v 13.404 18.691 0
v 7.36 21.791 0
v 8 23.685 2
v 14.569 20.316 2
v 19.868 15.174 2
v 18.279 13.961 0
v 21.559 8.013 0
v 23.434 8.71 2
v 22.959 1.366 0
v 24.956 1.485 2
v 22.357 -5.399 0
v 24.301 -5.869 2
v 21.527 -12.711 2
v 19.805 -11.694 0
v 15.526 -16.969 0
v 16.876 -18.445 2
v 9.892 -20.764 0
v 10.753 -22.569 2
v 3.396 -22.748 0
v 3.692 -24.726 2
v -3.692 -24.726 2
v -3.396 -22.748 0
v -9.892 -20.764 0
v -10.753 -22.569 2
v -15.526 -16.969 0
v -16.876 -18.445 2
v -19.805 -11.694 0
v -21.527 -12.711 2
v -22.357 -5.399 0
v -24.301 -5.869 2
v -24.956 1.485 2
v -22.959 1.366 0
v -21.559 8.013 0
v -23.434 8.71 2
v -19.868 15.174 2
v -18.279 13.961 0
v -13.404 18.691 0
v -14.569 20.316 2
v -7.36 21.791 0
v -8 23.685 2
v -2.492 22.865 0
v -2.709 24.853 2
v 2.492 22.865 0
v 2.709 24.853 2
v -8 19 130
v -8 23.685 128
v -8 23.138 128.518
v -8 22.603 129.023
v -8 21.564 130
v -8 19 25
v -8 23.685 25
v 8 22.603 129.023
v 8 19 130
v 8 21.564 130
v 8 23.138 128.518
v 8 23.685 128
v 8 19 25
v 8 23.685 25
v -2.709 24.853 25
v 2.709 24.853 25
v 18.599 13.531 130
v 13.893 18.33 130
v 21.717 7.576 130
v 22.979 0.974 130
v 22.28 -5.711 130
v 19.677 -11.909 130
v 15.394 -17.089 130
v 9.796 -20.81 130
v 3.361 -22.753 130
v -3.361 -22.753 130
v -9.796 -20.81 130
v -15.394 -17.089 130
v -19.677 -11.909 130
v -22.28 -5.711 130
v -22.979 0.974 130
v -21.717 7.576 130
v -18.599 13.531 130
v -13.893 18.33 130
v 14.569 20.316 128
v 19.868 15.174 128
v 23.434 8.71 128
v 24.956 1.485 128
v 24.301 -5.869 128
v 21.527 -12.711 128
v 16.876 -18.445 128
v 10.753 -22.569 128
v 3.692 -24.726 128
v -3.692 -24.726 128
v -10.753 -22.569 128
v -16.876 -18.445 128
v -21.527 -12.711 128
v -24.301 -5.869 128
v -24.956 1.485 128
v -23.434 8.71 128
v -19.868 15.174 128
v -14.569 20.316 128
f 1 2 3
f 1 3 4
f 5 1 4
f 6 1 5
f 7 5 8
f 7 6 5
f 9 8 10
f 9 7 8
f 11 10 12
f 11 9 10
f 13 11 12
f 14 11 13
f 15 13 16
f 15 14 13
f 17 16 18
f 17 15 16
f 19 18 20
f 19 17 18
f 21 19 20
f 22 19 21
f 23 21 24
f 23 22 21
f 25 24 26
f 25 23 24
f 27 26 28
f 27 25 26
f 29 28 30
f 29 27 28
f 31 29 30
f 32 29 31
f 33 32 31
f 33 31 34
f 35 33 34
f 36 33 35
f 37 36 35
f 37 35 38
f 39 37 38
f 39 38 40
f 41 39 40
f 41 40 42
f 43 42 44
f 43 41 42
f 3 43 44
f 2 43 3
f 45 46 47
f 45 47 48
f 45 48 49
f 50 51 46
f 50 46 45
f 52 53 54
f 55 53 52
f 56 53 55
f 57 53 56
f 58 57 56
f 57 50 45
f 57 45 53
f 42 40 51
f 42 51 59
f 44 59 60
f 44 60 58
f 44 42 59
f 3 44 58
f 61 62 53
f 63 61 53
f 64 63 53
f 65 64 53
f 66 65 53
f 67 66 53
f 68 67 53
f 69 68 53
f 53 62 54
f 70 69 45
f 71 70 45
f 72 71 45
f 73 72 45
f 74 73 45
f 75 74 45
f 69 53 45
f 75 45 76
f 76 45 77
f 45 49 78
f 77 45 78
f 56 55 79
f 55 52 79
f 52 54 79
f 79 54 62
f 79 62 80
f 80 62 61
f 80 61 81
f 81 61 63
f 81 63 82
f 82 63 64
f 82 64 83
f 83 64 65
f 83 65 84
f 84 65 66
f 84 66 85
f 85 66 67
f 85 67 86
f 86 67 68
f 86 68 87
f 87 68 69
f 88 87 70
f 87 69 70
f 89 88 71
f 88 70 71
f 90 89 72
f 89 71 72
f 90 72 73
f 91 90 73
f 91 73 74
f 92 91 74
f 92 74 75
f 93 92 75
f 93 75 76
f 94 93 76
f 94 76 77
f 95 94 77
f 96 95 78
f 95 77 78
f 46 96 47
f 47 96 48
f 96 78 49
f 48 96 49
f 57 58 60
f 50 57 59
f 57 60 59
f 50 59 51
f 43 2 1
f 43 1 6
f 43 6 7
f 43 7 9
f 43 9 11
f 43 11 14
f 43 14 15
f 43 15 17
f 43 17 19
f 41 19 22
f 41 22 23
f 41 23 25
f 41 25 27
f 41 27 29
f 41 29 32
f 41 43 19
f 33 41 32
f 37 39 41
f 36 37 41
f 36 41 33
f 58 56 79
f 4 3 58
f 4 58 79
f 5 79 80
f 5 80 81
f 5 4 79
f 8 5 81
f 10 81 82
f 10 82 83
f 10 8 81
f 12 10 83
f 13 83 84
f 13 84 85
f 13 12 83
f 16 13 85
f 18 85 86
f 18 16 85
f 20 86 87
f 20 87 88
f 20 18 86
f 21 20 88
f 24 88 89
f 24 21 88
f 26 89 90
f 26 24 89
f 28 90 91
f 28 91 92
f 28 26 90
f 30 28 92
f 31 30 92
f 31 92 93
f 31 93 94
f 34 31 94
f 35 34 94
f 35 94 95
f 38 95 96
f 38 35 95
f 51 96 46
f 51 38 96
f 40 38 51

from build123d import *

# Parameters (mm, degrees)
BOSS_EXTRUDE1_DEPTH = 130
BOSS_EXTRUDE2_DEPTH = 25
CHAMFER1_SIZE       = 2


with BuildPart() as part:
    # Sketch1 → Boss-Extrude1 (new body)
    with BuildSketch(Plane.XY):
        with BuildLine():
            Line((-8, 19), (8, 19))
            Line((8, 19), (8, 23.685438565))
            ThreePointArc((8, 23.685438565), (0, -25), (-8, 23.685438565))
            Line((-8, 23.685438565), (-8, 19))
        make_face()
    extrude(amount=BOSS_EXTRUDE1_DEPTH)

    # Sketch2 → Boss-Extrude2 (add)
    with BuildSketch(Plane(origin=(0, 0, 0), x_dir=(-1, 0, 0), z_dir=(0, 0, -1))):
        with BuildLine():
            Line((-8, 23.685438565), (-8, 19))
            Line((-8, 19), (8, 19))
            Line((8, 19), (8, 23.685438565))
            ThreePointArc((8, 23.685438565), (0, 25), (-8, 23.685438565))
        make_face()
    extrude(amount=-BOSS_EXTRUDE2_DEPTH)

    # Chamfer1
    chamfer1_edges = [part.edges().sort_by_distance(p)[0] for p in [
        (0, -25, 130),
        (8, -23.685438565, 0),
    ]]
    chamfer(chamfer1_edges, length=CHAMFER1_SIZE)


solid = part.part
